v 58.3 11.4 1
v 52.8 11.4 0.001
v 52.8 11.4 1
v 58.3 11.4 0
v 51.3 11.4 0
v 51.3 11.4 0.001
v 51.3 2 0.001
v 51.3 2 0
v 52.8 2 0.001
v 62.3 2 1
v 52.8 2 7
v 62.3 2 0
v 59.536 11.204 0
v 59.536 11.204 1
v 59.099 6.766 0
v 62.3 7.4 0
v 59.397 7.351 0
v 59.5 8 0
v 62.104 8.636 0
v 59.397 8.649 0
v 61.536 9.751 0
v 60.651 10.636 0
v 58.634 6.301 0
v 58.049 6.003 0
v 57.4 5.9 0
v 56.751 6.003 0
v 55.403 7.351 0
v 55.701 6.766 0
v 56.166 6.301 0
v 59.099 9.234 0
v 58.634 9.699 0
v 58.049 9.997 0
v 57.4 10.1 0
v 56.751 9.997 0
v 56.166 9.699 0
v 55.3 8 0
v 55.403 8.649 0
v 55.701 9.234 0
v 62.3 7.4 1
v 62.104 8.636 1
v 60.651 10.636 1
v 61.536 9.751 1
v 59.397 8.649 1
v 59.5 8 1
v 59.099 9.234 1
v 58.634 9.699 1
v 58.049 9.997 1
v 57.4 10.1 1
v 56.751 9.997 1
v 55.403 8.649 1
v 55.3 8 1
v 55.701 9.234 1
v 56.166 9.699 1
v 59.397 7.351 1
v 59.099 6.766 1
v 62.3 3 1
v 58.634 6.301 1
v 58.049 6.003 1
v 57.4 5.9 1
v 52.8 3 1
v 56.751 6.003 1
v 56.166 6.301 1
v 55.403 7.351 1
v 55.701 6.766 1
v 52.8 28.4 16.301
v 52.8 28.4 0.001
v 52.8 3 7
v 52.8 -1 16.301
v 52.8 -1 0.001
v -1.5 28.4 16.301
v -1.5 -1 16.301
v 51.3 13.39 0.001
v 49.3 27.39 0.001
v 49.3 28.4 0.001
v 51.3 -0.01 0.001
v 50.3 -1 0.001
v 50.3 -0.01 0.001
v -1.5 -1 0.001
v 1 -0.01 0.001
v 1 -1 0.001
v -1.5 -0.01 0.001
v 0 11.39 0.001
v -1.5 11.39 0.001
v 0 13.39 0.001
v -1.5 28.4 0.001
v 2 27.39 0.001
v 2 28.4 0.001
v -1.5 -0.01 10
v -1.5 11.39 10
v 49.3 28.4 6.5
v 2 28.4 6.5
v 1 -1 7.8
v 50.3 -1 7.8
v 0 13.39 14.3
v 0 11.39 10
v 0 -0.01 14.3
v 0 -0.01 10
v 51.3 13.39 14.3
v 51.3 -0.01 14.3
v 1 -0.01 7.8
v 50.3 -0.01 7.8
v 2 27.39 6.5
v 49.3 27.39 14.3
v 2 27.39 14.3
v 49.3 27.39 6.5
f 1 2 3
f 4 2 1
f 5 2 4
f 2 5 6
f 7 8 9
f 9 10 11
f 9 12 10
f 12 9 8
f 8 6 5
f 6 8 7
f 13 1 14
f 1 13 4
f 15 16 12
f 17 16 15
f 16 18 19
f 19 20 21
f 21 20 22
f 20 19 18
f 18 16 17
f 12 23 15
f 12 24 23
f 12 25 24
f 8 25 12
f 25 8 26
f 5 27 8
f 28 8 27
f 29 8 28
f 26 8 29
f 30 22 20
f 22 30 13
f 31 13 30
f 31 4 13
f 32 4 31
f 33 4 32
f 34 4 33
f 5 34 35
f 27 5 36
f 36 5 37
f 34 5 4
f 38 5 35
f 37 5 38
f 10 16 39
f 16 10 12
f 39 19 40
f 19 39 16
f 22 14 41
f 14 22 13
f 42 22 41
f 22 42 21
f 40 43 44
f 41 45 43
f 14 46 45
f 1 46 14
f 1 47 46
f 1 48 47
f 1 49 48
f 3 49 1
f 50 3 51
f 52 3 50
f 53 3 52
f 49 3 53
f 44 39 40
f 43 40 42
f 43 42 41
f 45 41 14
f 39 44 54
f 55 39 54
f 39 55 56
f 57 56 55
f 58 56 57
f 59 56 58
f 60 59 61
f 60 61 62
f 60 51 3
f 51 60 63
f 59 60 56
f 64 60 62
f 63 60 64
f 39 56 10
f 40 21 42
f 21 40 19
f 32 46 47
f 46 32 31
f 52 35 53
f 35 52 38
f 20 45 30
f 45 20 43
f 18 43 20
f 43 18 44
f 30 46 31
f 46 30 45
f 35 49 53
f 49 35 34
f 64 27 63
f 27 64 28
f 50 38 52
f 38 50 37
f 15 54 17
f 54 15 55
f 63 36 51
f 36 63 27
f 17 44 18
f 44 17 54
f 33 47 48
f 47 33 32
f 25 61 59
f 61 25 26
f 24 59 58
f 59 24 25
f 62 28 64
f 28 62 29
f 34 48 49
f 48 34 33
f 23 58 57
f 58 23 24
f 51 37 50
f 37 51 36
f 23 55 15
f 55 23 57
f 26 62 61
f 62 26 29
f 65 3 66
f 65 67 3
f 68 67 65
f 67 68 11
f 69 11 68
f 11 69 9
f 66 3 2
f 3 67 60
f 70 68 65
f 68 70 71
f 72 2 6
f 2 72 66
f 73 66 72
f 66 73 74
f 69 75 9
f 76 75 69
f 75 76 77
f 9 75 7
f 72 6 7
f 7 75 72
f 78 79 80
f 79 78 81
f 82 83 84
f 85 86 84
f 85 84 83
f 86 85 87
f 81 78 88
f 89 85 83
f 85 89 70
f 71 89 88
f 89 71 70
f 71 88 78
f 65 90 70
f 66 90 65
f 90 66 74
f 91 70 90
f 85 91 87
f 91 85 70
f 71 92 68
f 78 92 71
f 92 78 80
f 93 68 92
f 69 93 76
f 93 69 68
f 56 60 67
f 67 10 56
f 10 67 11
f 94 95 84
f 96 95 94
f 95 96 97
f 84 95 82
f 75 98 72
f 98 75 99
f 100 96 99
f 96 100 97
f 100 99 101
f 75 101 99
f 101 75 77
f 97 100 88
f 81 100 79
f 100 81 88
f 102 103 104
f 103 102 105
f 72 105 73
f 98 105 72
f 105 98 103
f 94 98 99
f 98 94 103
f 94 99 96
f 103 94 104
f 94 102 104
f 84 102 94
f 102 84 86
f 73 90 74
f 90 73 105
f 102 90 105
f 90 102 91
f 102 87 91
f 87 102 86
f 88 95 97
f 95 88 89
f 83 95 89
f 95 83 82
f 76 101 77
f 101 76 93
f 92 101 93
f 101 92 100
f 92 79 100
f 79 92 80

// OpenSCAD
TERM_WIDTH = 50.8 + 0.5;
TERM_DEPTH = 11.4;
TERM_HEIGHT = 14.3;
TERM_SCREW_HEIGHT = 6.5;

CRIMP_LENGTH = 16;
WIRE_HOLE_SIZE = 8;

WALL = 2;
SIDE_WALL = 1.5;

difference() {
  union() {
    translate([-SIDE_WALL, -1, 0.001]) cube([TERM_WIDTH + 2*SIDE_WALL, TERM_DEPTH + CRIMP_LENGTH + WALL, TERM_HEIGHT + WALL]);
    // Tab
    translate([TERM_WIDTH,2,0]) difference() {
      hull() {
        cube([2, TERM_DEPTH-2, 1]);
        cube([11, 1, 1]);
        translate([11-4, TERM_DEPTH-2-4, 0]) cylinder(r=4, $fn=20);
      }
      translate([6.1,8-2,0]) cylinder(d=4.2, h=5, $fn=20);
    }
    // Tab side
    translate([TERM_WIDTH + SIDE_WALL,2+1,1])
      rotate([90,0,0]) linear_extrude(1) polygon([[0,0], [9.5,0], [0,6]]);
  }
  translate ([0,-0.01,0]) MASK();
  translate([1,-1,-TERM_SCREW_HEIGHT]) cube([TERM_WIDTH-2, 2, TERM_HEIGHT]);
}


module MASK() {
  // Case
//  translate([-19, -50+0.01, 0]) cube([TERM_WIDTH + 11 + 19, 50, 35]);

  hull() {
    // Terminals
    cube([TERM_WIDTH, TERM_DEPTH+2, TERM_HEIGHT]);
    // Crimps
    translate([2, TERM_DEPTH, 0]) cube([TERM_WIDTH-4, CRIMP_LENGTH, TERM_HEIGHT]);
  }
  // Wire
  translate([2, TERM_DEPTH + CRIMP_LENGTH - WIRE_HOLE_SIZE, 0]) cube([TERM_WIDTH-4, WIRE_HOLE_SIZE + WALL + 0.001, TERM_SCREW_HEIGHT]);
  
  // Adj pot
  translate([-8, 0,0]) cube([8.001, TERM_DEPTH, 10]);
}
